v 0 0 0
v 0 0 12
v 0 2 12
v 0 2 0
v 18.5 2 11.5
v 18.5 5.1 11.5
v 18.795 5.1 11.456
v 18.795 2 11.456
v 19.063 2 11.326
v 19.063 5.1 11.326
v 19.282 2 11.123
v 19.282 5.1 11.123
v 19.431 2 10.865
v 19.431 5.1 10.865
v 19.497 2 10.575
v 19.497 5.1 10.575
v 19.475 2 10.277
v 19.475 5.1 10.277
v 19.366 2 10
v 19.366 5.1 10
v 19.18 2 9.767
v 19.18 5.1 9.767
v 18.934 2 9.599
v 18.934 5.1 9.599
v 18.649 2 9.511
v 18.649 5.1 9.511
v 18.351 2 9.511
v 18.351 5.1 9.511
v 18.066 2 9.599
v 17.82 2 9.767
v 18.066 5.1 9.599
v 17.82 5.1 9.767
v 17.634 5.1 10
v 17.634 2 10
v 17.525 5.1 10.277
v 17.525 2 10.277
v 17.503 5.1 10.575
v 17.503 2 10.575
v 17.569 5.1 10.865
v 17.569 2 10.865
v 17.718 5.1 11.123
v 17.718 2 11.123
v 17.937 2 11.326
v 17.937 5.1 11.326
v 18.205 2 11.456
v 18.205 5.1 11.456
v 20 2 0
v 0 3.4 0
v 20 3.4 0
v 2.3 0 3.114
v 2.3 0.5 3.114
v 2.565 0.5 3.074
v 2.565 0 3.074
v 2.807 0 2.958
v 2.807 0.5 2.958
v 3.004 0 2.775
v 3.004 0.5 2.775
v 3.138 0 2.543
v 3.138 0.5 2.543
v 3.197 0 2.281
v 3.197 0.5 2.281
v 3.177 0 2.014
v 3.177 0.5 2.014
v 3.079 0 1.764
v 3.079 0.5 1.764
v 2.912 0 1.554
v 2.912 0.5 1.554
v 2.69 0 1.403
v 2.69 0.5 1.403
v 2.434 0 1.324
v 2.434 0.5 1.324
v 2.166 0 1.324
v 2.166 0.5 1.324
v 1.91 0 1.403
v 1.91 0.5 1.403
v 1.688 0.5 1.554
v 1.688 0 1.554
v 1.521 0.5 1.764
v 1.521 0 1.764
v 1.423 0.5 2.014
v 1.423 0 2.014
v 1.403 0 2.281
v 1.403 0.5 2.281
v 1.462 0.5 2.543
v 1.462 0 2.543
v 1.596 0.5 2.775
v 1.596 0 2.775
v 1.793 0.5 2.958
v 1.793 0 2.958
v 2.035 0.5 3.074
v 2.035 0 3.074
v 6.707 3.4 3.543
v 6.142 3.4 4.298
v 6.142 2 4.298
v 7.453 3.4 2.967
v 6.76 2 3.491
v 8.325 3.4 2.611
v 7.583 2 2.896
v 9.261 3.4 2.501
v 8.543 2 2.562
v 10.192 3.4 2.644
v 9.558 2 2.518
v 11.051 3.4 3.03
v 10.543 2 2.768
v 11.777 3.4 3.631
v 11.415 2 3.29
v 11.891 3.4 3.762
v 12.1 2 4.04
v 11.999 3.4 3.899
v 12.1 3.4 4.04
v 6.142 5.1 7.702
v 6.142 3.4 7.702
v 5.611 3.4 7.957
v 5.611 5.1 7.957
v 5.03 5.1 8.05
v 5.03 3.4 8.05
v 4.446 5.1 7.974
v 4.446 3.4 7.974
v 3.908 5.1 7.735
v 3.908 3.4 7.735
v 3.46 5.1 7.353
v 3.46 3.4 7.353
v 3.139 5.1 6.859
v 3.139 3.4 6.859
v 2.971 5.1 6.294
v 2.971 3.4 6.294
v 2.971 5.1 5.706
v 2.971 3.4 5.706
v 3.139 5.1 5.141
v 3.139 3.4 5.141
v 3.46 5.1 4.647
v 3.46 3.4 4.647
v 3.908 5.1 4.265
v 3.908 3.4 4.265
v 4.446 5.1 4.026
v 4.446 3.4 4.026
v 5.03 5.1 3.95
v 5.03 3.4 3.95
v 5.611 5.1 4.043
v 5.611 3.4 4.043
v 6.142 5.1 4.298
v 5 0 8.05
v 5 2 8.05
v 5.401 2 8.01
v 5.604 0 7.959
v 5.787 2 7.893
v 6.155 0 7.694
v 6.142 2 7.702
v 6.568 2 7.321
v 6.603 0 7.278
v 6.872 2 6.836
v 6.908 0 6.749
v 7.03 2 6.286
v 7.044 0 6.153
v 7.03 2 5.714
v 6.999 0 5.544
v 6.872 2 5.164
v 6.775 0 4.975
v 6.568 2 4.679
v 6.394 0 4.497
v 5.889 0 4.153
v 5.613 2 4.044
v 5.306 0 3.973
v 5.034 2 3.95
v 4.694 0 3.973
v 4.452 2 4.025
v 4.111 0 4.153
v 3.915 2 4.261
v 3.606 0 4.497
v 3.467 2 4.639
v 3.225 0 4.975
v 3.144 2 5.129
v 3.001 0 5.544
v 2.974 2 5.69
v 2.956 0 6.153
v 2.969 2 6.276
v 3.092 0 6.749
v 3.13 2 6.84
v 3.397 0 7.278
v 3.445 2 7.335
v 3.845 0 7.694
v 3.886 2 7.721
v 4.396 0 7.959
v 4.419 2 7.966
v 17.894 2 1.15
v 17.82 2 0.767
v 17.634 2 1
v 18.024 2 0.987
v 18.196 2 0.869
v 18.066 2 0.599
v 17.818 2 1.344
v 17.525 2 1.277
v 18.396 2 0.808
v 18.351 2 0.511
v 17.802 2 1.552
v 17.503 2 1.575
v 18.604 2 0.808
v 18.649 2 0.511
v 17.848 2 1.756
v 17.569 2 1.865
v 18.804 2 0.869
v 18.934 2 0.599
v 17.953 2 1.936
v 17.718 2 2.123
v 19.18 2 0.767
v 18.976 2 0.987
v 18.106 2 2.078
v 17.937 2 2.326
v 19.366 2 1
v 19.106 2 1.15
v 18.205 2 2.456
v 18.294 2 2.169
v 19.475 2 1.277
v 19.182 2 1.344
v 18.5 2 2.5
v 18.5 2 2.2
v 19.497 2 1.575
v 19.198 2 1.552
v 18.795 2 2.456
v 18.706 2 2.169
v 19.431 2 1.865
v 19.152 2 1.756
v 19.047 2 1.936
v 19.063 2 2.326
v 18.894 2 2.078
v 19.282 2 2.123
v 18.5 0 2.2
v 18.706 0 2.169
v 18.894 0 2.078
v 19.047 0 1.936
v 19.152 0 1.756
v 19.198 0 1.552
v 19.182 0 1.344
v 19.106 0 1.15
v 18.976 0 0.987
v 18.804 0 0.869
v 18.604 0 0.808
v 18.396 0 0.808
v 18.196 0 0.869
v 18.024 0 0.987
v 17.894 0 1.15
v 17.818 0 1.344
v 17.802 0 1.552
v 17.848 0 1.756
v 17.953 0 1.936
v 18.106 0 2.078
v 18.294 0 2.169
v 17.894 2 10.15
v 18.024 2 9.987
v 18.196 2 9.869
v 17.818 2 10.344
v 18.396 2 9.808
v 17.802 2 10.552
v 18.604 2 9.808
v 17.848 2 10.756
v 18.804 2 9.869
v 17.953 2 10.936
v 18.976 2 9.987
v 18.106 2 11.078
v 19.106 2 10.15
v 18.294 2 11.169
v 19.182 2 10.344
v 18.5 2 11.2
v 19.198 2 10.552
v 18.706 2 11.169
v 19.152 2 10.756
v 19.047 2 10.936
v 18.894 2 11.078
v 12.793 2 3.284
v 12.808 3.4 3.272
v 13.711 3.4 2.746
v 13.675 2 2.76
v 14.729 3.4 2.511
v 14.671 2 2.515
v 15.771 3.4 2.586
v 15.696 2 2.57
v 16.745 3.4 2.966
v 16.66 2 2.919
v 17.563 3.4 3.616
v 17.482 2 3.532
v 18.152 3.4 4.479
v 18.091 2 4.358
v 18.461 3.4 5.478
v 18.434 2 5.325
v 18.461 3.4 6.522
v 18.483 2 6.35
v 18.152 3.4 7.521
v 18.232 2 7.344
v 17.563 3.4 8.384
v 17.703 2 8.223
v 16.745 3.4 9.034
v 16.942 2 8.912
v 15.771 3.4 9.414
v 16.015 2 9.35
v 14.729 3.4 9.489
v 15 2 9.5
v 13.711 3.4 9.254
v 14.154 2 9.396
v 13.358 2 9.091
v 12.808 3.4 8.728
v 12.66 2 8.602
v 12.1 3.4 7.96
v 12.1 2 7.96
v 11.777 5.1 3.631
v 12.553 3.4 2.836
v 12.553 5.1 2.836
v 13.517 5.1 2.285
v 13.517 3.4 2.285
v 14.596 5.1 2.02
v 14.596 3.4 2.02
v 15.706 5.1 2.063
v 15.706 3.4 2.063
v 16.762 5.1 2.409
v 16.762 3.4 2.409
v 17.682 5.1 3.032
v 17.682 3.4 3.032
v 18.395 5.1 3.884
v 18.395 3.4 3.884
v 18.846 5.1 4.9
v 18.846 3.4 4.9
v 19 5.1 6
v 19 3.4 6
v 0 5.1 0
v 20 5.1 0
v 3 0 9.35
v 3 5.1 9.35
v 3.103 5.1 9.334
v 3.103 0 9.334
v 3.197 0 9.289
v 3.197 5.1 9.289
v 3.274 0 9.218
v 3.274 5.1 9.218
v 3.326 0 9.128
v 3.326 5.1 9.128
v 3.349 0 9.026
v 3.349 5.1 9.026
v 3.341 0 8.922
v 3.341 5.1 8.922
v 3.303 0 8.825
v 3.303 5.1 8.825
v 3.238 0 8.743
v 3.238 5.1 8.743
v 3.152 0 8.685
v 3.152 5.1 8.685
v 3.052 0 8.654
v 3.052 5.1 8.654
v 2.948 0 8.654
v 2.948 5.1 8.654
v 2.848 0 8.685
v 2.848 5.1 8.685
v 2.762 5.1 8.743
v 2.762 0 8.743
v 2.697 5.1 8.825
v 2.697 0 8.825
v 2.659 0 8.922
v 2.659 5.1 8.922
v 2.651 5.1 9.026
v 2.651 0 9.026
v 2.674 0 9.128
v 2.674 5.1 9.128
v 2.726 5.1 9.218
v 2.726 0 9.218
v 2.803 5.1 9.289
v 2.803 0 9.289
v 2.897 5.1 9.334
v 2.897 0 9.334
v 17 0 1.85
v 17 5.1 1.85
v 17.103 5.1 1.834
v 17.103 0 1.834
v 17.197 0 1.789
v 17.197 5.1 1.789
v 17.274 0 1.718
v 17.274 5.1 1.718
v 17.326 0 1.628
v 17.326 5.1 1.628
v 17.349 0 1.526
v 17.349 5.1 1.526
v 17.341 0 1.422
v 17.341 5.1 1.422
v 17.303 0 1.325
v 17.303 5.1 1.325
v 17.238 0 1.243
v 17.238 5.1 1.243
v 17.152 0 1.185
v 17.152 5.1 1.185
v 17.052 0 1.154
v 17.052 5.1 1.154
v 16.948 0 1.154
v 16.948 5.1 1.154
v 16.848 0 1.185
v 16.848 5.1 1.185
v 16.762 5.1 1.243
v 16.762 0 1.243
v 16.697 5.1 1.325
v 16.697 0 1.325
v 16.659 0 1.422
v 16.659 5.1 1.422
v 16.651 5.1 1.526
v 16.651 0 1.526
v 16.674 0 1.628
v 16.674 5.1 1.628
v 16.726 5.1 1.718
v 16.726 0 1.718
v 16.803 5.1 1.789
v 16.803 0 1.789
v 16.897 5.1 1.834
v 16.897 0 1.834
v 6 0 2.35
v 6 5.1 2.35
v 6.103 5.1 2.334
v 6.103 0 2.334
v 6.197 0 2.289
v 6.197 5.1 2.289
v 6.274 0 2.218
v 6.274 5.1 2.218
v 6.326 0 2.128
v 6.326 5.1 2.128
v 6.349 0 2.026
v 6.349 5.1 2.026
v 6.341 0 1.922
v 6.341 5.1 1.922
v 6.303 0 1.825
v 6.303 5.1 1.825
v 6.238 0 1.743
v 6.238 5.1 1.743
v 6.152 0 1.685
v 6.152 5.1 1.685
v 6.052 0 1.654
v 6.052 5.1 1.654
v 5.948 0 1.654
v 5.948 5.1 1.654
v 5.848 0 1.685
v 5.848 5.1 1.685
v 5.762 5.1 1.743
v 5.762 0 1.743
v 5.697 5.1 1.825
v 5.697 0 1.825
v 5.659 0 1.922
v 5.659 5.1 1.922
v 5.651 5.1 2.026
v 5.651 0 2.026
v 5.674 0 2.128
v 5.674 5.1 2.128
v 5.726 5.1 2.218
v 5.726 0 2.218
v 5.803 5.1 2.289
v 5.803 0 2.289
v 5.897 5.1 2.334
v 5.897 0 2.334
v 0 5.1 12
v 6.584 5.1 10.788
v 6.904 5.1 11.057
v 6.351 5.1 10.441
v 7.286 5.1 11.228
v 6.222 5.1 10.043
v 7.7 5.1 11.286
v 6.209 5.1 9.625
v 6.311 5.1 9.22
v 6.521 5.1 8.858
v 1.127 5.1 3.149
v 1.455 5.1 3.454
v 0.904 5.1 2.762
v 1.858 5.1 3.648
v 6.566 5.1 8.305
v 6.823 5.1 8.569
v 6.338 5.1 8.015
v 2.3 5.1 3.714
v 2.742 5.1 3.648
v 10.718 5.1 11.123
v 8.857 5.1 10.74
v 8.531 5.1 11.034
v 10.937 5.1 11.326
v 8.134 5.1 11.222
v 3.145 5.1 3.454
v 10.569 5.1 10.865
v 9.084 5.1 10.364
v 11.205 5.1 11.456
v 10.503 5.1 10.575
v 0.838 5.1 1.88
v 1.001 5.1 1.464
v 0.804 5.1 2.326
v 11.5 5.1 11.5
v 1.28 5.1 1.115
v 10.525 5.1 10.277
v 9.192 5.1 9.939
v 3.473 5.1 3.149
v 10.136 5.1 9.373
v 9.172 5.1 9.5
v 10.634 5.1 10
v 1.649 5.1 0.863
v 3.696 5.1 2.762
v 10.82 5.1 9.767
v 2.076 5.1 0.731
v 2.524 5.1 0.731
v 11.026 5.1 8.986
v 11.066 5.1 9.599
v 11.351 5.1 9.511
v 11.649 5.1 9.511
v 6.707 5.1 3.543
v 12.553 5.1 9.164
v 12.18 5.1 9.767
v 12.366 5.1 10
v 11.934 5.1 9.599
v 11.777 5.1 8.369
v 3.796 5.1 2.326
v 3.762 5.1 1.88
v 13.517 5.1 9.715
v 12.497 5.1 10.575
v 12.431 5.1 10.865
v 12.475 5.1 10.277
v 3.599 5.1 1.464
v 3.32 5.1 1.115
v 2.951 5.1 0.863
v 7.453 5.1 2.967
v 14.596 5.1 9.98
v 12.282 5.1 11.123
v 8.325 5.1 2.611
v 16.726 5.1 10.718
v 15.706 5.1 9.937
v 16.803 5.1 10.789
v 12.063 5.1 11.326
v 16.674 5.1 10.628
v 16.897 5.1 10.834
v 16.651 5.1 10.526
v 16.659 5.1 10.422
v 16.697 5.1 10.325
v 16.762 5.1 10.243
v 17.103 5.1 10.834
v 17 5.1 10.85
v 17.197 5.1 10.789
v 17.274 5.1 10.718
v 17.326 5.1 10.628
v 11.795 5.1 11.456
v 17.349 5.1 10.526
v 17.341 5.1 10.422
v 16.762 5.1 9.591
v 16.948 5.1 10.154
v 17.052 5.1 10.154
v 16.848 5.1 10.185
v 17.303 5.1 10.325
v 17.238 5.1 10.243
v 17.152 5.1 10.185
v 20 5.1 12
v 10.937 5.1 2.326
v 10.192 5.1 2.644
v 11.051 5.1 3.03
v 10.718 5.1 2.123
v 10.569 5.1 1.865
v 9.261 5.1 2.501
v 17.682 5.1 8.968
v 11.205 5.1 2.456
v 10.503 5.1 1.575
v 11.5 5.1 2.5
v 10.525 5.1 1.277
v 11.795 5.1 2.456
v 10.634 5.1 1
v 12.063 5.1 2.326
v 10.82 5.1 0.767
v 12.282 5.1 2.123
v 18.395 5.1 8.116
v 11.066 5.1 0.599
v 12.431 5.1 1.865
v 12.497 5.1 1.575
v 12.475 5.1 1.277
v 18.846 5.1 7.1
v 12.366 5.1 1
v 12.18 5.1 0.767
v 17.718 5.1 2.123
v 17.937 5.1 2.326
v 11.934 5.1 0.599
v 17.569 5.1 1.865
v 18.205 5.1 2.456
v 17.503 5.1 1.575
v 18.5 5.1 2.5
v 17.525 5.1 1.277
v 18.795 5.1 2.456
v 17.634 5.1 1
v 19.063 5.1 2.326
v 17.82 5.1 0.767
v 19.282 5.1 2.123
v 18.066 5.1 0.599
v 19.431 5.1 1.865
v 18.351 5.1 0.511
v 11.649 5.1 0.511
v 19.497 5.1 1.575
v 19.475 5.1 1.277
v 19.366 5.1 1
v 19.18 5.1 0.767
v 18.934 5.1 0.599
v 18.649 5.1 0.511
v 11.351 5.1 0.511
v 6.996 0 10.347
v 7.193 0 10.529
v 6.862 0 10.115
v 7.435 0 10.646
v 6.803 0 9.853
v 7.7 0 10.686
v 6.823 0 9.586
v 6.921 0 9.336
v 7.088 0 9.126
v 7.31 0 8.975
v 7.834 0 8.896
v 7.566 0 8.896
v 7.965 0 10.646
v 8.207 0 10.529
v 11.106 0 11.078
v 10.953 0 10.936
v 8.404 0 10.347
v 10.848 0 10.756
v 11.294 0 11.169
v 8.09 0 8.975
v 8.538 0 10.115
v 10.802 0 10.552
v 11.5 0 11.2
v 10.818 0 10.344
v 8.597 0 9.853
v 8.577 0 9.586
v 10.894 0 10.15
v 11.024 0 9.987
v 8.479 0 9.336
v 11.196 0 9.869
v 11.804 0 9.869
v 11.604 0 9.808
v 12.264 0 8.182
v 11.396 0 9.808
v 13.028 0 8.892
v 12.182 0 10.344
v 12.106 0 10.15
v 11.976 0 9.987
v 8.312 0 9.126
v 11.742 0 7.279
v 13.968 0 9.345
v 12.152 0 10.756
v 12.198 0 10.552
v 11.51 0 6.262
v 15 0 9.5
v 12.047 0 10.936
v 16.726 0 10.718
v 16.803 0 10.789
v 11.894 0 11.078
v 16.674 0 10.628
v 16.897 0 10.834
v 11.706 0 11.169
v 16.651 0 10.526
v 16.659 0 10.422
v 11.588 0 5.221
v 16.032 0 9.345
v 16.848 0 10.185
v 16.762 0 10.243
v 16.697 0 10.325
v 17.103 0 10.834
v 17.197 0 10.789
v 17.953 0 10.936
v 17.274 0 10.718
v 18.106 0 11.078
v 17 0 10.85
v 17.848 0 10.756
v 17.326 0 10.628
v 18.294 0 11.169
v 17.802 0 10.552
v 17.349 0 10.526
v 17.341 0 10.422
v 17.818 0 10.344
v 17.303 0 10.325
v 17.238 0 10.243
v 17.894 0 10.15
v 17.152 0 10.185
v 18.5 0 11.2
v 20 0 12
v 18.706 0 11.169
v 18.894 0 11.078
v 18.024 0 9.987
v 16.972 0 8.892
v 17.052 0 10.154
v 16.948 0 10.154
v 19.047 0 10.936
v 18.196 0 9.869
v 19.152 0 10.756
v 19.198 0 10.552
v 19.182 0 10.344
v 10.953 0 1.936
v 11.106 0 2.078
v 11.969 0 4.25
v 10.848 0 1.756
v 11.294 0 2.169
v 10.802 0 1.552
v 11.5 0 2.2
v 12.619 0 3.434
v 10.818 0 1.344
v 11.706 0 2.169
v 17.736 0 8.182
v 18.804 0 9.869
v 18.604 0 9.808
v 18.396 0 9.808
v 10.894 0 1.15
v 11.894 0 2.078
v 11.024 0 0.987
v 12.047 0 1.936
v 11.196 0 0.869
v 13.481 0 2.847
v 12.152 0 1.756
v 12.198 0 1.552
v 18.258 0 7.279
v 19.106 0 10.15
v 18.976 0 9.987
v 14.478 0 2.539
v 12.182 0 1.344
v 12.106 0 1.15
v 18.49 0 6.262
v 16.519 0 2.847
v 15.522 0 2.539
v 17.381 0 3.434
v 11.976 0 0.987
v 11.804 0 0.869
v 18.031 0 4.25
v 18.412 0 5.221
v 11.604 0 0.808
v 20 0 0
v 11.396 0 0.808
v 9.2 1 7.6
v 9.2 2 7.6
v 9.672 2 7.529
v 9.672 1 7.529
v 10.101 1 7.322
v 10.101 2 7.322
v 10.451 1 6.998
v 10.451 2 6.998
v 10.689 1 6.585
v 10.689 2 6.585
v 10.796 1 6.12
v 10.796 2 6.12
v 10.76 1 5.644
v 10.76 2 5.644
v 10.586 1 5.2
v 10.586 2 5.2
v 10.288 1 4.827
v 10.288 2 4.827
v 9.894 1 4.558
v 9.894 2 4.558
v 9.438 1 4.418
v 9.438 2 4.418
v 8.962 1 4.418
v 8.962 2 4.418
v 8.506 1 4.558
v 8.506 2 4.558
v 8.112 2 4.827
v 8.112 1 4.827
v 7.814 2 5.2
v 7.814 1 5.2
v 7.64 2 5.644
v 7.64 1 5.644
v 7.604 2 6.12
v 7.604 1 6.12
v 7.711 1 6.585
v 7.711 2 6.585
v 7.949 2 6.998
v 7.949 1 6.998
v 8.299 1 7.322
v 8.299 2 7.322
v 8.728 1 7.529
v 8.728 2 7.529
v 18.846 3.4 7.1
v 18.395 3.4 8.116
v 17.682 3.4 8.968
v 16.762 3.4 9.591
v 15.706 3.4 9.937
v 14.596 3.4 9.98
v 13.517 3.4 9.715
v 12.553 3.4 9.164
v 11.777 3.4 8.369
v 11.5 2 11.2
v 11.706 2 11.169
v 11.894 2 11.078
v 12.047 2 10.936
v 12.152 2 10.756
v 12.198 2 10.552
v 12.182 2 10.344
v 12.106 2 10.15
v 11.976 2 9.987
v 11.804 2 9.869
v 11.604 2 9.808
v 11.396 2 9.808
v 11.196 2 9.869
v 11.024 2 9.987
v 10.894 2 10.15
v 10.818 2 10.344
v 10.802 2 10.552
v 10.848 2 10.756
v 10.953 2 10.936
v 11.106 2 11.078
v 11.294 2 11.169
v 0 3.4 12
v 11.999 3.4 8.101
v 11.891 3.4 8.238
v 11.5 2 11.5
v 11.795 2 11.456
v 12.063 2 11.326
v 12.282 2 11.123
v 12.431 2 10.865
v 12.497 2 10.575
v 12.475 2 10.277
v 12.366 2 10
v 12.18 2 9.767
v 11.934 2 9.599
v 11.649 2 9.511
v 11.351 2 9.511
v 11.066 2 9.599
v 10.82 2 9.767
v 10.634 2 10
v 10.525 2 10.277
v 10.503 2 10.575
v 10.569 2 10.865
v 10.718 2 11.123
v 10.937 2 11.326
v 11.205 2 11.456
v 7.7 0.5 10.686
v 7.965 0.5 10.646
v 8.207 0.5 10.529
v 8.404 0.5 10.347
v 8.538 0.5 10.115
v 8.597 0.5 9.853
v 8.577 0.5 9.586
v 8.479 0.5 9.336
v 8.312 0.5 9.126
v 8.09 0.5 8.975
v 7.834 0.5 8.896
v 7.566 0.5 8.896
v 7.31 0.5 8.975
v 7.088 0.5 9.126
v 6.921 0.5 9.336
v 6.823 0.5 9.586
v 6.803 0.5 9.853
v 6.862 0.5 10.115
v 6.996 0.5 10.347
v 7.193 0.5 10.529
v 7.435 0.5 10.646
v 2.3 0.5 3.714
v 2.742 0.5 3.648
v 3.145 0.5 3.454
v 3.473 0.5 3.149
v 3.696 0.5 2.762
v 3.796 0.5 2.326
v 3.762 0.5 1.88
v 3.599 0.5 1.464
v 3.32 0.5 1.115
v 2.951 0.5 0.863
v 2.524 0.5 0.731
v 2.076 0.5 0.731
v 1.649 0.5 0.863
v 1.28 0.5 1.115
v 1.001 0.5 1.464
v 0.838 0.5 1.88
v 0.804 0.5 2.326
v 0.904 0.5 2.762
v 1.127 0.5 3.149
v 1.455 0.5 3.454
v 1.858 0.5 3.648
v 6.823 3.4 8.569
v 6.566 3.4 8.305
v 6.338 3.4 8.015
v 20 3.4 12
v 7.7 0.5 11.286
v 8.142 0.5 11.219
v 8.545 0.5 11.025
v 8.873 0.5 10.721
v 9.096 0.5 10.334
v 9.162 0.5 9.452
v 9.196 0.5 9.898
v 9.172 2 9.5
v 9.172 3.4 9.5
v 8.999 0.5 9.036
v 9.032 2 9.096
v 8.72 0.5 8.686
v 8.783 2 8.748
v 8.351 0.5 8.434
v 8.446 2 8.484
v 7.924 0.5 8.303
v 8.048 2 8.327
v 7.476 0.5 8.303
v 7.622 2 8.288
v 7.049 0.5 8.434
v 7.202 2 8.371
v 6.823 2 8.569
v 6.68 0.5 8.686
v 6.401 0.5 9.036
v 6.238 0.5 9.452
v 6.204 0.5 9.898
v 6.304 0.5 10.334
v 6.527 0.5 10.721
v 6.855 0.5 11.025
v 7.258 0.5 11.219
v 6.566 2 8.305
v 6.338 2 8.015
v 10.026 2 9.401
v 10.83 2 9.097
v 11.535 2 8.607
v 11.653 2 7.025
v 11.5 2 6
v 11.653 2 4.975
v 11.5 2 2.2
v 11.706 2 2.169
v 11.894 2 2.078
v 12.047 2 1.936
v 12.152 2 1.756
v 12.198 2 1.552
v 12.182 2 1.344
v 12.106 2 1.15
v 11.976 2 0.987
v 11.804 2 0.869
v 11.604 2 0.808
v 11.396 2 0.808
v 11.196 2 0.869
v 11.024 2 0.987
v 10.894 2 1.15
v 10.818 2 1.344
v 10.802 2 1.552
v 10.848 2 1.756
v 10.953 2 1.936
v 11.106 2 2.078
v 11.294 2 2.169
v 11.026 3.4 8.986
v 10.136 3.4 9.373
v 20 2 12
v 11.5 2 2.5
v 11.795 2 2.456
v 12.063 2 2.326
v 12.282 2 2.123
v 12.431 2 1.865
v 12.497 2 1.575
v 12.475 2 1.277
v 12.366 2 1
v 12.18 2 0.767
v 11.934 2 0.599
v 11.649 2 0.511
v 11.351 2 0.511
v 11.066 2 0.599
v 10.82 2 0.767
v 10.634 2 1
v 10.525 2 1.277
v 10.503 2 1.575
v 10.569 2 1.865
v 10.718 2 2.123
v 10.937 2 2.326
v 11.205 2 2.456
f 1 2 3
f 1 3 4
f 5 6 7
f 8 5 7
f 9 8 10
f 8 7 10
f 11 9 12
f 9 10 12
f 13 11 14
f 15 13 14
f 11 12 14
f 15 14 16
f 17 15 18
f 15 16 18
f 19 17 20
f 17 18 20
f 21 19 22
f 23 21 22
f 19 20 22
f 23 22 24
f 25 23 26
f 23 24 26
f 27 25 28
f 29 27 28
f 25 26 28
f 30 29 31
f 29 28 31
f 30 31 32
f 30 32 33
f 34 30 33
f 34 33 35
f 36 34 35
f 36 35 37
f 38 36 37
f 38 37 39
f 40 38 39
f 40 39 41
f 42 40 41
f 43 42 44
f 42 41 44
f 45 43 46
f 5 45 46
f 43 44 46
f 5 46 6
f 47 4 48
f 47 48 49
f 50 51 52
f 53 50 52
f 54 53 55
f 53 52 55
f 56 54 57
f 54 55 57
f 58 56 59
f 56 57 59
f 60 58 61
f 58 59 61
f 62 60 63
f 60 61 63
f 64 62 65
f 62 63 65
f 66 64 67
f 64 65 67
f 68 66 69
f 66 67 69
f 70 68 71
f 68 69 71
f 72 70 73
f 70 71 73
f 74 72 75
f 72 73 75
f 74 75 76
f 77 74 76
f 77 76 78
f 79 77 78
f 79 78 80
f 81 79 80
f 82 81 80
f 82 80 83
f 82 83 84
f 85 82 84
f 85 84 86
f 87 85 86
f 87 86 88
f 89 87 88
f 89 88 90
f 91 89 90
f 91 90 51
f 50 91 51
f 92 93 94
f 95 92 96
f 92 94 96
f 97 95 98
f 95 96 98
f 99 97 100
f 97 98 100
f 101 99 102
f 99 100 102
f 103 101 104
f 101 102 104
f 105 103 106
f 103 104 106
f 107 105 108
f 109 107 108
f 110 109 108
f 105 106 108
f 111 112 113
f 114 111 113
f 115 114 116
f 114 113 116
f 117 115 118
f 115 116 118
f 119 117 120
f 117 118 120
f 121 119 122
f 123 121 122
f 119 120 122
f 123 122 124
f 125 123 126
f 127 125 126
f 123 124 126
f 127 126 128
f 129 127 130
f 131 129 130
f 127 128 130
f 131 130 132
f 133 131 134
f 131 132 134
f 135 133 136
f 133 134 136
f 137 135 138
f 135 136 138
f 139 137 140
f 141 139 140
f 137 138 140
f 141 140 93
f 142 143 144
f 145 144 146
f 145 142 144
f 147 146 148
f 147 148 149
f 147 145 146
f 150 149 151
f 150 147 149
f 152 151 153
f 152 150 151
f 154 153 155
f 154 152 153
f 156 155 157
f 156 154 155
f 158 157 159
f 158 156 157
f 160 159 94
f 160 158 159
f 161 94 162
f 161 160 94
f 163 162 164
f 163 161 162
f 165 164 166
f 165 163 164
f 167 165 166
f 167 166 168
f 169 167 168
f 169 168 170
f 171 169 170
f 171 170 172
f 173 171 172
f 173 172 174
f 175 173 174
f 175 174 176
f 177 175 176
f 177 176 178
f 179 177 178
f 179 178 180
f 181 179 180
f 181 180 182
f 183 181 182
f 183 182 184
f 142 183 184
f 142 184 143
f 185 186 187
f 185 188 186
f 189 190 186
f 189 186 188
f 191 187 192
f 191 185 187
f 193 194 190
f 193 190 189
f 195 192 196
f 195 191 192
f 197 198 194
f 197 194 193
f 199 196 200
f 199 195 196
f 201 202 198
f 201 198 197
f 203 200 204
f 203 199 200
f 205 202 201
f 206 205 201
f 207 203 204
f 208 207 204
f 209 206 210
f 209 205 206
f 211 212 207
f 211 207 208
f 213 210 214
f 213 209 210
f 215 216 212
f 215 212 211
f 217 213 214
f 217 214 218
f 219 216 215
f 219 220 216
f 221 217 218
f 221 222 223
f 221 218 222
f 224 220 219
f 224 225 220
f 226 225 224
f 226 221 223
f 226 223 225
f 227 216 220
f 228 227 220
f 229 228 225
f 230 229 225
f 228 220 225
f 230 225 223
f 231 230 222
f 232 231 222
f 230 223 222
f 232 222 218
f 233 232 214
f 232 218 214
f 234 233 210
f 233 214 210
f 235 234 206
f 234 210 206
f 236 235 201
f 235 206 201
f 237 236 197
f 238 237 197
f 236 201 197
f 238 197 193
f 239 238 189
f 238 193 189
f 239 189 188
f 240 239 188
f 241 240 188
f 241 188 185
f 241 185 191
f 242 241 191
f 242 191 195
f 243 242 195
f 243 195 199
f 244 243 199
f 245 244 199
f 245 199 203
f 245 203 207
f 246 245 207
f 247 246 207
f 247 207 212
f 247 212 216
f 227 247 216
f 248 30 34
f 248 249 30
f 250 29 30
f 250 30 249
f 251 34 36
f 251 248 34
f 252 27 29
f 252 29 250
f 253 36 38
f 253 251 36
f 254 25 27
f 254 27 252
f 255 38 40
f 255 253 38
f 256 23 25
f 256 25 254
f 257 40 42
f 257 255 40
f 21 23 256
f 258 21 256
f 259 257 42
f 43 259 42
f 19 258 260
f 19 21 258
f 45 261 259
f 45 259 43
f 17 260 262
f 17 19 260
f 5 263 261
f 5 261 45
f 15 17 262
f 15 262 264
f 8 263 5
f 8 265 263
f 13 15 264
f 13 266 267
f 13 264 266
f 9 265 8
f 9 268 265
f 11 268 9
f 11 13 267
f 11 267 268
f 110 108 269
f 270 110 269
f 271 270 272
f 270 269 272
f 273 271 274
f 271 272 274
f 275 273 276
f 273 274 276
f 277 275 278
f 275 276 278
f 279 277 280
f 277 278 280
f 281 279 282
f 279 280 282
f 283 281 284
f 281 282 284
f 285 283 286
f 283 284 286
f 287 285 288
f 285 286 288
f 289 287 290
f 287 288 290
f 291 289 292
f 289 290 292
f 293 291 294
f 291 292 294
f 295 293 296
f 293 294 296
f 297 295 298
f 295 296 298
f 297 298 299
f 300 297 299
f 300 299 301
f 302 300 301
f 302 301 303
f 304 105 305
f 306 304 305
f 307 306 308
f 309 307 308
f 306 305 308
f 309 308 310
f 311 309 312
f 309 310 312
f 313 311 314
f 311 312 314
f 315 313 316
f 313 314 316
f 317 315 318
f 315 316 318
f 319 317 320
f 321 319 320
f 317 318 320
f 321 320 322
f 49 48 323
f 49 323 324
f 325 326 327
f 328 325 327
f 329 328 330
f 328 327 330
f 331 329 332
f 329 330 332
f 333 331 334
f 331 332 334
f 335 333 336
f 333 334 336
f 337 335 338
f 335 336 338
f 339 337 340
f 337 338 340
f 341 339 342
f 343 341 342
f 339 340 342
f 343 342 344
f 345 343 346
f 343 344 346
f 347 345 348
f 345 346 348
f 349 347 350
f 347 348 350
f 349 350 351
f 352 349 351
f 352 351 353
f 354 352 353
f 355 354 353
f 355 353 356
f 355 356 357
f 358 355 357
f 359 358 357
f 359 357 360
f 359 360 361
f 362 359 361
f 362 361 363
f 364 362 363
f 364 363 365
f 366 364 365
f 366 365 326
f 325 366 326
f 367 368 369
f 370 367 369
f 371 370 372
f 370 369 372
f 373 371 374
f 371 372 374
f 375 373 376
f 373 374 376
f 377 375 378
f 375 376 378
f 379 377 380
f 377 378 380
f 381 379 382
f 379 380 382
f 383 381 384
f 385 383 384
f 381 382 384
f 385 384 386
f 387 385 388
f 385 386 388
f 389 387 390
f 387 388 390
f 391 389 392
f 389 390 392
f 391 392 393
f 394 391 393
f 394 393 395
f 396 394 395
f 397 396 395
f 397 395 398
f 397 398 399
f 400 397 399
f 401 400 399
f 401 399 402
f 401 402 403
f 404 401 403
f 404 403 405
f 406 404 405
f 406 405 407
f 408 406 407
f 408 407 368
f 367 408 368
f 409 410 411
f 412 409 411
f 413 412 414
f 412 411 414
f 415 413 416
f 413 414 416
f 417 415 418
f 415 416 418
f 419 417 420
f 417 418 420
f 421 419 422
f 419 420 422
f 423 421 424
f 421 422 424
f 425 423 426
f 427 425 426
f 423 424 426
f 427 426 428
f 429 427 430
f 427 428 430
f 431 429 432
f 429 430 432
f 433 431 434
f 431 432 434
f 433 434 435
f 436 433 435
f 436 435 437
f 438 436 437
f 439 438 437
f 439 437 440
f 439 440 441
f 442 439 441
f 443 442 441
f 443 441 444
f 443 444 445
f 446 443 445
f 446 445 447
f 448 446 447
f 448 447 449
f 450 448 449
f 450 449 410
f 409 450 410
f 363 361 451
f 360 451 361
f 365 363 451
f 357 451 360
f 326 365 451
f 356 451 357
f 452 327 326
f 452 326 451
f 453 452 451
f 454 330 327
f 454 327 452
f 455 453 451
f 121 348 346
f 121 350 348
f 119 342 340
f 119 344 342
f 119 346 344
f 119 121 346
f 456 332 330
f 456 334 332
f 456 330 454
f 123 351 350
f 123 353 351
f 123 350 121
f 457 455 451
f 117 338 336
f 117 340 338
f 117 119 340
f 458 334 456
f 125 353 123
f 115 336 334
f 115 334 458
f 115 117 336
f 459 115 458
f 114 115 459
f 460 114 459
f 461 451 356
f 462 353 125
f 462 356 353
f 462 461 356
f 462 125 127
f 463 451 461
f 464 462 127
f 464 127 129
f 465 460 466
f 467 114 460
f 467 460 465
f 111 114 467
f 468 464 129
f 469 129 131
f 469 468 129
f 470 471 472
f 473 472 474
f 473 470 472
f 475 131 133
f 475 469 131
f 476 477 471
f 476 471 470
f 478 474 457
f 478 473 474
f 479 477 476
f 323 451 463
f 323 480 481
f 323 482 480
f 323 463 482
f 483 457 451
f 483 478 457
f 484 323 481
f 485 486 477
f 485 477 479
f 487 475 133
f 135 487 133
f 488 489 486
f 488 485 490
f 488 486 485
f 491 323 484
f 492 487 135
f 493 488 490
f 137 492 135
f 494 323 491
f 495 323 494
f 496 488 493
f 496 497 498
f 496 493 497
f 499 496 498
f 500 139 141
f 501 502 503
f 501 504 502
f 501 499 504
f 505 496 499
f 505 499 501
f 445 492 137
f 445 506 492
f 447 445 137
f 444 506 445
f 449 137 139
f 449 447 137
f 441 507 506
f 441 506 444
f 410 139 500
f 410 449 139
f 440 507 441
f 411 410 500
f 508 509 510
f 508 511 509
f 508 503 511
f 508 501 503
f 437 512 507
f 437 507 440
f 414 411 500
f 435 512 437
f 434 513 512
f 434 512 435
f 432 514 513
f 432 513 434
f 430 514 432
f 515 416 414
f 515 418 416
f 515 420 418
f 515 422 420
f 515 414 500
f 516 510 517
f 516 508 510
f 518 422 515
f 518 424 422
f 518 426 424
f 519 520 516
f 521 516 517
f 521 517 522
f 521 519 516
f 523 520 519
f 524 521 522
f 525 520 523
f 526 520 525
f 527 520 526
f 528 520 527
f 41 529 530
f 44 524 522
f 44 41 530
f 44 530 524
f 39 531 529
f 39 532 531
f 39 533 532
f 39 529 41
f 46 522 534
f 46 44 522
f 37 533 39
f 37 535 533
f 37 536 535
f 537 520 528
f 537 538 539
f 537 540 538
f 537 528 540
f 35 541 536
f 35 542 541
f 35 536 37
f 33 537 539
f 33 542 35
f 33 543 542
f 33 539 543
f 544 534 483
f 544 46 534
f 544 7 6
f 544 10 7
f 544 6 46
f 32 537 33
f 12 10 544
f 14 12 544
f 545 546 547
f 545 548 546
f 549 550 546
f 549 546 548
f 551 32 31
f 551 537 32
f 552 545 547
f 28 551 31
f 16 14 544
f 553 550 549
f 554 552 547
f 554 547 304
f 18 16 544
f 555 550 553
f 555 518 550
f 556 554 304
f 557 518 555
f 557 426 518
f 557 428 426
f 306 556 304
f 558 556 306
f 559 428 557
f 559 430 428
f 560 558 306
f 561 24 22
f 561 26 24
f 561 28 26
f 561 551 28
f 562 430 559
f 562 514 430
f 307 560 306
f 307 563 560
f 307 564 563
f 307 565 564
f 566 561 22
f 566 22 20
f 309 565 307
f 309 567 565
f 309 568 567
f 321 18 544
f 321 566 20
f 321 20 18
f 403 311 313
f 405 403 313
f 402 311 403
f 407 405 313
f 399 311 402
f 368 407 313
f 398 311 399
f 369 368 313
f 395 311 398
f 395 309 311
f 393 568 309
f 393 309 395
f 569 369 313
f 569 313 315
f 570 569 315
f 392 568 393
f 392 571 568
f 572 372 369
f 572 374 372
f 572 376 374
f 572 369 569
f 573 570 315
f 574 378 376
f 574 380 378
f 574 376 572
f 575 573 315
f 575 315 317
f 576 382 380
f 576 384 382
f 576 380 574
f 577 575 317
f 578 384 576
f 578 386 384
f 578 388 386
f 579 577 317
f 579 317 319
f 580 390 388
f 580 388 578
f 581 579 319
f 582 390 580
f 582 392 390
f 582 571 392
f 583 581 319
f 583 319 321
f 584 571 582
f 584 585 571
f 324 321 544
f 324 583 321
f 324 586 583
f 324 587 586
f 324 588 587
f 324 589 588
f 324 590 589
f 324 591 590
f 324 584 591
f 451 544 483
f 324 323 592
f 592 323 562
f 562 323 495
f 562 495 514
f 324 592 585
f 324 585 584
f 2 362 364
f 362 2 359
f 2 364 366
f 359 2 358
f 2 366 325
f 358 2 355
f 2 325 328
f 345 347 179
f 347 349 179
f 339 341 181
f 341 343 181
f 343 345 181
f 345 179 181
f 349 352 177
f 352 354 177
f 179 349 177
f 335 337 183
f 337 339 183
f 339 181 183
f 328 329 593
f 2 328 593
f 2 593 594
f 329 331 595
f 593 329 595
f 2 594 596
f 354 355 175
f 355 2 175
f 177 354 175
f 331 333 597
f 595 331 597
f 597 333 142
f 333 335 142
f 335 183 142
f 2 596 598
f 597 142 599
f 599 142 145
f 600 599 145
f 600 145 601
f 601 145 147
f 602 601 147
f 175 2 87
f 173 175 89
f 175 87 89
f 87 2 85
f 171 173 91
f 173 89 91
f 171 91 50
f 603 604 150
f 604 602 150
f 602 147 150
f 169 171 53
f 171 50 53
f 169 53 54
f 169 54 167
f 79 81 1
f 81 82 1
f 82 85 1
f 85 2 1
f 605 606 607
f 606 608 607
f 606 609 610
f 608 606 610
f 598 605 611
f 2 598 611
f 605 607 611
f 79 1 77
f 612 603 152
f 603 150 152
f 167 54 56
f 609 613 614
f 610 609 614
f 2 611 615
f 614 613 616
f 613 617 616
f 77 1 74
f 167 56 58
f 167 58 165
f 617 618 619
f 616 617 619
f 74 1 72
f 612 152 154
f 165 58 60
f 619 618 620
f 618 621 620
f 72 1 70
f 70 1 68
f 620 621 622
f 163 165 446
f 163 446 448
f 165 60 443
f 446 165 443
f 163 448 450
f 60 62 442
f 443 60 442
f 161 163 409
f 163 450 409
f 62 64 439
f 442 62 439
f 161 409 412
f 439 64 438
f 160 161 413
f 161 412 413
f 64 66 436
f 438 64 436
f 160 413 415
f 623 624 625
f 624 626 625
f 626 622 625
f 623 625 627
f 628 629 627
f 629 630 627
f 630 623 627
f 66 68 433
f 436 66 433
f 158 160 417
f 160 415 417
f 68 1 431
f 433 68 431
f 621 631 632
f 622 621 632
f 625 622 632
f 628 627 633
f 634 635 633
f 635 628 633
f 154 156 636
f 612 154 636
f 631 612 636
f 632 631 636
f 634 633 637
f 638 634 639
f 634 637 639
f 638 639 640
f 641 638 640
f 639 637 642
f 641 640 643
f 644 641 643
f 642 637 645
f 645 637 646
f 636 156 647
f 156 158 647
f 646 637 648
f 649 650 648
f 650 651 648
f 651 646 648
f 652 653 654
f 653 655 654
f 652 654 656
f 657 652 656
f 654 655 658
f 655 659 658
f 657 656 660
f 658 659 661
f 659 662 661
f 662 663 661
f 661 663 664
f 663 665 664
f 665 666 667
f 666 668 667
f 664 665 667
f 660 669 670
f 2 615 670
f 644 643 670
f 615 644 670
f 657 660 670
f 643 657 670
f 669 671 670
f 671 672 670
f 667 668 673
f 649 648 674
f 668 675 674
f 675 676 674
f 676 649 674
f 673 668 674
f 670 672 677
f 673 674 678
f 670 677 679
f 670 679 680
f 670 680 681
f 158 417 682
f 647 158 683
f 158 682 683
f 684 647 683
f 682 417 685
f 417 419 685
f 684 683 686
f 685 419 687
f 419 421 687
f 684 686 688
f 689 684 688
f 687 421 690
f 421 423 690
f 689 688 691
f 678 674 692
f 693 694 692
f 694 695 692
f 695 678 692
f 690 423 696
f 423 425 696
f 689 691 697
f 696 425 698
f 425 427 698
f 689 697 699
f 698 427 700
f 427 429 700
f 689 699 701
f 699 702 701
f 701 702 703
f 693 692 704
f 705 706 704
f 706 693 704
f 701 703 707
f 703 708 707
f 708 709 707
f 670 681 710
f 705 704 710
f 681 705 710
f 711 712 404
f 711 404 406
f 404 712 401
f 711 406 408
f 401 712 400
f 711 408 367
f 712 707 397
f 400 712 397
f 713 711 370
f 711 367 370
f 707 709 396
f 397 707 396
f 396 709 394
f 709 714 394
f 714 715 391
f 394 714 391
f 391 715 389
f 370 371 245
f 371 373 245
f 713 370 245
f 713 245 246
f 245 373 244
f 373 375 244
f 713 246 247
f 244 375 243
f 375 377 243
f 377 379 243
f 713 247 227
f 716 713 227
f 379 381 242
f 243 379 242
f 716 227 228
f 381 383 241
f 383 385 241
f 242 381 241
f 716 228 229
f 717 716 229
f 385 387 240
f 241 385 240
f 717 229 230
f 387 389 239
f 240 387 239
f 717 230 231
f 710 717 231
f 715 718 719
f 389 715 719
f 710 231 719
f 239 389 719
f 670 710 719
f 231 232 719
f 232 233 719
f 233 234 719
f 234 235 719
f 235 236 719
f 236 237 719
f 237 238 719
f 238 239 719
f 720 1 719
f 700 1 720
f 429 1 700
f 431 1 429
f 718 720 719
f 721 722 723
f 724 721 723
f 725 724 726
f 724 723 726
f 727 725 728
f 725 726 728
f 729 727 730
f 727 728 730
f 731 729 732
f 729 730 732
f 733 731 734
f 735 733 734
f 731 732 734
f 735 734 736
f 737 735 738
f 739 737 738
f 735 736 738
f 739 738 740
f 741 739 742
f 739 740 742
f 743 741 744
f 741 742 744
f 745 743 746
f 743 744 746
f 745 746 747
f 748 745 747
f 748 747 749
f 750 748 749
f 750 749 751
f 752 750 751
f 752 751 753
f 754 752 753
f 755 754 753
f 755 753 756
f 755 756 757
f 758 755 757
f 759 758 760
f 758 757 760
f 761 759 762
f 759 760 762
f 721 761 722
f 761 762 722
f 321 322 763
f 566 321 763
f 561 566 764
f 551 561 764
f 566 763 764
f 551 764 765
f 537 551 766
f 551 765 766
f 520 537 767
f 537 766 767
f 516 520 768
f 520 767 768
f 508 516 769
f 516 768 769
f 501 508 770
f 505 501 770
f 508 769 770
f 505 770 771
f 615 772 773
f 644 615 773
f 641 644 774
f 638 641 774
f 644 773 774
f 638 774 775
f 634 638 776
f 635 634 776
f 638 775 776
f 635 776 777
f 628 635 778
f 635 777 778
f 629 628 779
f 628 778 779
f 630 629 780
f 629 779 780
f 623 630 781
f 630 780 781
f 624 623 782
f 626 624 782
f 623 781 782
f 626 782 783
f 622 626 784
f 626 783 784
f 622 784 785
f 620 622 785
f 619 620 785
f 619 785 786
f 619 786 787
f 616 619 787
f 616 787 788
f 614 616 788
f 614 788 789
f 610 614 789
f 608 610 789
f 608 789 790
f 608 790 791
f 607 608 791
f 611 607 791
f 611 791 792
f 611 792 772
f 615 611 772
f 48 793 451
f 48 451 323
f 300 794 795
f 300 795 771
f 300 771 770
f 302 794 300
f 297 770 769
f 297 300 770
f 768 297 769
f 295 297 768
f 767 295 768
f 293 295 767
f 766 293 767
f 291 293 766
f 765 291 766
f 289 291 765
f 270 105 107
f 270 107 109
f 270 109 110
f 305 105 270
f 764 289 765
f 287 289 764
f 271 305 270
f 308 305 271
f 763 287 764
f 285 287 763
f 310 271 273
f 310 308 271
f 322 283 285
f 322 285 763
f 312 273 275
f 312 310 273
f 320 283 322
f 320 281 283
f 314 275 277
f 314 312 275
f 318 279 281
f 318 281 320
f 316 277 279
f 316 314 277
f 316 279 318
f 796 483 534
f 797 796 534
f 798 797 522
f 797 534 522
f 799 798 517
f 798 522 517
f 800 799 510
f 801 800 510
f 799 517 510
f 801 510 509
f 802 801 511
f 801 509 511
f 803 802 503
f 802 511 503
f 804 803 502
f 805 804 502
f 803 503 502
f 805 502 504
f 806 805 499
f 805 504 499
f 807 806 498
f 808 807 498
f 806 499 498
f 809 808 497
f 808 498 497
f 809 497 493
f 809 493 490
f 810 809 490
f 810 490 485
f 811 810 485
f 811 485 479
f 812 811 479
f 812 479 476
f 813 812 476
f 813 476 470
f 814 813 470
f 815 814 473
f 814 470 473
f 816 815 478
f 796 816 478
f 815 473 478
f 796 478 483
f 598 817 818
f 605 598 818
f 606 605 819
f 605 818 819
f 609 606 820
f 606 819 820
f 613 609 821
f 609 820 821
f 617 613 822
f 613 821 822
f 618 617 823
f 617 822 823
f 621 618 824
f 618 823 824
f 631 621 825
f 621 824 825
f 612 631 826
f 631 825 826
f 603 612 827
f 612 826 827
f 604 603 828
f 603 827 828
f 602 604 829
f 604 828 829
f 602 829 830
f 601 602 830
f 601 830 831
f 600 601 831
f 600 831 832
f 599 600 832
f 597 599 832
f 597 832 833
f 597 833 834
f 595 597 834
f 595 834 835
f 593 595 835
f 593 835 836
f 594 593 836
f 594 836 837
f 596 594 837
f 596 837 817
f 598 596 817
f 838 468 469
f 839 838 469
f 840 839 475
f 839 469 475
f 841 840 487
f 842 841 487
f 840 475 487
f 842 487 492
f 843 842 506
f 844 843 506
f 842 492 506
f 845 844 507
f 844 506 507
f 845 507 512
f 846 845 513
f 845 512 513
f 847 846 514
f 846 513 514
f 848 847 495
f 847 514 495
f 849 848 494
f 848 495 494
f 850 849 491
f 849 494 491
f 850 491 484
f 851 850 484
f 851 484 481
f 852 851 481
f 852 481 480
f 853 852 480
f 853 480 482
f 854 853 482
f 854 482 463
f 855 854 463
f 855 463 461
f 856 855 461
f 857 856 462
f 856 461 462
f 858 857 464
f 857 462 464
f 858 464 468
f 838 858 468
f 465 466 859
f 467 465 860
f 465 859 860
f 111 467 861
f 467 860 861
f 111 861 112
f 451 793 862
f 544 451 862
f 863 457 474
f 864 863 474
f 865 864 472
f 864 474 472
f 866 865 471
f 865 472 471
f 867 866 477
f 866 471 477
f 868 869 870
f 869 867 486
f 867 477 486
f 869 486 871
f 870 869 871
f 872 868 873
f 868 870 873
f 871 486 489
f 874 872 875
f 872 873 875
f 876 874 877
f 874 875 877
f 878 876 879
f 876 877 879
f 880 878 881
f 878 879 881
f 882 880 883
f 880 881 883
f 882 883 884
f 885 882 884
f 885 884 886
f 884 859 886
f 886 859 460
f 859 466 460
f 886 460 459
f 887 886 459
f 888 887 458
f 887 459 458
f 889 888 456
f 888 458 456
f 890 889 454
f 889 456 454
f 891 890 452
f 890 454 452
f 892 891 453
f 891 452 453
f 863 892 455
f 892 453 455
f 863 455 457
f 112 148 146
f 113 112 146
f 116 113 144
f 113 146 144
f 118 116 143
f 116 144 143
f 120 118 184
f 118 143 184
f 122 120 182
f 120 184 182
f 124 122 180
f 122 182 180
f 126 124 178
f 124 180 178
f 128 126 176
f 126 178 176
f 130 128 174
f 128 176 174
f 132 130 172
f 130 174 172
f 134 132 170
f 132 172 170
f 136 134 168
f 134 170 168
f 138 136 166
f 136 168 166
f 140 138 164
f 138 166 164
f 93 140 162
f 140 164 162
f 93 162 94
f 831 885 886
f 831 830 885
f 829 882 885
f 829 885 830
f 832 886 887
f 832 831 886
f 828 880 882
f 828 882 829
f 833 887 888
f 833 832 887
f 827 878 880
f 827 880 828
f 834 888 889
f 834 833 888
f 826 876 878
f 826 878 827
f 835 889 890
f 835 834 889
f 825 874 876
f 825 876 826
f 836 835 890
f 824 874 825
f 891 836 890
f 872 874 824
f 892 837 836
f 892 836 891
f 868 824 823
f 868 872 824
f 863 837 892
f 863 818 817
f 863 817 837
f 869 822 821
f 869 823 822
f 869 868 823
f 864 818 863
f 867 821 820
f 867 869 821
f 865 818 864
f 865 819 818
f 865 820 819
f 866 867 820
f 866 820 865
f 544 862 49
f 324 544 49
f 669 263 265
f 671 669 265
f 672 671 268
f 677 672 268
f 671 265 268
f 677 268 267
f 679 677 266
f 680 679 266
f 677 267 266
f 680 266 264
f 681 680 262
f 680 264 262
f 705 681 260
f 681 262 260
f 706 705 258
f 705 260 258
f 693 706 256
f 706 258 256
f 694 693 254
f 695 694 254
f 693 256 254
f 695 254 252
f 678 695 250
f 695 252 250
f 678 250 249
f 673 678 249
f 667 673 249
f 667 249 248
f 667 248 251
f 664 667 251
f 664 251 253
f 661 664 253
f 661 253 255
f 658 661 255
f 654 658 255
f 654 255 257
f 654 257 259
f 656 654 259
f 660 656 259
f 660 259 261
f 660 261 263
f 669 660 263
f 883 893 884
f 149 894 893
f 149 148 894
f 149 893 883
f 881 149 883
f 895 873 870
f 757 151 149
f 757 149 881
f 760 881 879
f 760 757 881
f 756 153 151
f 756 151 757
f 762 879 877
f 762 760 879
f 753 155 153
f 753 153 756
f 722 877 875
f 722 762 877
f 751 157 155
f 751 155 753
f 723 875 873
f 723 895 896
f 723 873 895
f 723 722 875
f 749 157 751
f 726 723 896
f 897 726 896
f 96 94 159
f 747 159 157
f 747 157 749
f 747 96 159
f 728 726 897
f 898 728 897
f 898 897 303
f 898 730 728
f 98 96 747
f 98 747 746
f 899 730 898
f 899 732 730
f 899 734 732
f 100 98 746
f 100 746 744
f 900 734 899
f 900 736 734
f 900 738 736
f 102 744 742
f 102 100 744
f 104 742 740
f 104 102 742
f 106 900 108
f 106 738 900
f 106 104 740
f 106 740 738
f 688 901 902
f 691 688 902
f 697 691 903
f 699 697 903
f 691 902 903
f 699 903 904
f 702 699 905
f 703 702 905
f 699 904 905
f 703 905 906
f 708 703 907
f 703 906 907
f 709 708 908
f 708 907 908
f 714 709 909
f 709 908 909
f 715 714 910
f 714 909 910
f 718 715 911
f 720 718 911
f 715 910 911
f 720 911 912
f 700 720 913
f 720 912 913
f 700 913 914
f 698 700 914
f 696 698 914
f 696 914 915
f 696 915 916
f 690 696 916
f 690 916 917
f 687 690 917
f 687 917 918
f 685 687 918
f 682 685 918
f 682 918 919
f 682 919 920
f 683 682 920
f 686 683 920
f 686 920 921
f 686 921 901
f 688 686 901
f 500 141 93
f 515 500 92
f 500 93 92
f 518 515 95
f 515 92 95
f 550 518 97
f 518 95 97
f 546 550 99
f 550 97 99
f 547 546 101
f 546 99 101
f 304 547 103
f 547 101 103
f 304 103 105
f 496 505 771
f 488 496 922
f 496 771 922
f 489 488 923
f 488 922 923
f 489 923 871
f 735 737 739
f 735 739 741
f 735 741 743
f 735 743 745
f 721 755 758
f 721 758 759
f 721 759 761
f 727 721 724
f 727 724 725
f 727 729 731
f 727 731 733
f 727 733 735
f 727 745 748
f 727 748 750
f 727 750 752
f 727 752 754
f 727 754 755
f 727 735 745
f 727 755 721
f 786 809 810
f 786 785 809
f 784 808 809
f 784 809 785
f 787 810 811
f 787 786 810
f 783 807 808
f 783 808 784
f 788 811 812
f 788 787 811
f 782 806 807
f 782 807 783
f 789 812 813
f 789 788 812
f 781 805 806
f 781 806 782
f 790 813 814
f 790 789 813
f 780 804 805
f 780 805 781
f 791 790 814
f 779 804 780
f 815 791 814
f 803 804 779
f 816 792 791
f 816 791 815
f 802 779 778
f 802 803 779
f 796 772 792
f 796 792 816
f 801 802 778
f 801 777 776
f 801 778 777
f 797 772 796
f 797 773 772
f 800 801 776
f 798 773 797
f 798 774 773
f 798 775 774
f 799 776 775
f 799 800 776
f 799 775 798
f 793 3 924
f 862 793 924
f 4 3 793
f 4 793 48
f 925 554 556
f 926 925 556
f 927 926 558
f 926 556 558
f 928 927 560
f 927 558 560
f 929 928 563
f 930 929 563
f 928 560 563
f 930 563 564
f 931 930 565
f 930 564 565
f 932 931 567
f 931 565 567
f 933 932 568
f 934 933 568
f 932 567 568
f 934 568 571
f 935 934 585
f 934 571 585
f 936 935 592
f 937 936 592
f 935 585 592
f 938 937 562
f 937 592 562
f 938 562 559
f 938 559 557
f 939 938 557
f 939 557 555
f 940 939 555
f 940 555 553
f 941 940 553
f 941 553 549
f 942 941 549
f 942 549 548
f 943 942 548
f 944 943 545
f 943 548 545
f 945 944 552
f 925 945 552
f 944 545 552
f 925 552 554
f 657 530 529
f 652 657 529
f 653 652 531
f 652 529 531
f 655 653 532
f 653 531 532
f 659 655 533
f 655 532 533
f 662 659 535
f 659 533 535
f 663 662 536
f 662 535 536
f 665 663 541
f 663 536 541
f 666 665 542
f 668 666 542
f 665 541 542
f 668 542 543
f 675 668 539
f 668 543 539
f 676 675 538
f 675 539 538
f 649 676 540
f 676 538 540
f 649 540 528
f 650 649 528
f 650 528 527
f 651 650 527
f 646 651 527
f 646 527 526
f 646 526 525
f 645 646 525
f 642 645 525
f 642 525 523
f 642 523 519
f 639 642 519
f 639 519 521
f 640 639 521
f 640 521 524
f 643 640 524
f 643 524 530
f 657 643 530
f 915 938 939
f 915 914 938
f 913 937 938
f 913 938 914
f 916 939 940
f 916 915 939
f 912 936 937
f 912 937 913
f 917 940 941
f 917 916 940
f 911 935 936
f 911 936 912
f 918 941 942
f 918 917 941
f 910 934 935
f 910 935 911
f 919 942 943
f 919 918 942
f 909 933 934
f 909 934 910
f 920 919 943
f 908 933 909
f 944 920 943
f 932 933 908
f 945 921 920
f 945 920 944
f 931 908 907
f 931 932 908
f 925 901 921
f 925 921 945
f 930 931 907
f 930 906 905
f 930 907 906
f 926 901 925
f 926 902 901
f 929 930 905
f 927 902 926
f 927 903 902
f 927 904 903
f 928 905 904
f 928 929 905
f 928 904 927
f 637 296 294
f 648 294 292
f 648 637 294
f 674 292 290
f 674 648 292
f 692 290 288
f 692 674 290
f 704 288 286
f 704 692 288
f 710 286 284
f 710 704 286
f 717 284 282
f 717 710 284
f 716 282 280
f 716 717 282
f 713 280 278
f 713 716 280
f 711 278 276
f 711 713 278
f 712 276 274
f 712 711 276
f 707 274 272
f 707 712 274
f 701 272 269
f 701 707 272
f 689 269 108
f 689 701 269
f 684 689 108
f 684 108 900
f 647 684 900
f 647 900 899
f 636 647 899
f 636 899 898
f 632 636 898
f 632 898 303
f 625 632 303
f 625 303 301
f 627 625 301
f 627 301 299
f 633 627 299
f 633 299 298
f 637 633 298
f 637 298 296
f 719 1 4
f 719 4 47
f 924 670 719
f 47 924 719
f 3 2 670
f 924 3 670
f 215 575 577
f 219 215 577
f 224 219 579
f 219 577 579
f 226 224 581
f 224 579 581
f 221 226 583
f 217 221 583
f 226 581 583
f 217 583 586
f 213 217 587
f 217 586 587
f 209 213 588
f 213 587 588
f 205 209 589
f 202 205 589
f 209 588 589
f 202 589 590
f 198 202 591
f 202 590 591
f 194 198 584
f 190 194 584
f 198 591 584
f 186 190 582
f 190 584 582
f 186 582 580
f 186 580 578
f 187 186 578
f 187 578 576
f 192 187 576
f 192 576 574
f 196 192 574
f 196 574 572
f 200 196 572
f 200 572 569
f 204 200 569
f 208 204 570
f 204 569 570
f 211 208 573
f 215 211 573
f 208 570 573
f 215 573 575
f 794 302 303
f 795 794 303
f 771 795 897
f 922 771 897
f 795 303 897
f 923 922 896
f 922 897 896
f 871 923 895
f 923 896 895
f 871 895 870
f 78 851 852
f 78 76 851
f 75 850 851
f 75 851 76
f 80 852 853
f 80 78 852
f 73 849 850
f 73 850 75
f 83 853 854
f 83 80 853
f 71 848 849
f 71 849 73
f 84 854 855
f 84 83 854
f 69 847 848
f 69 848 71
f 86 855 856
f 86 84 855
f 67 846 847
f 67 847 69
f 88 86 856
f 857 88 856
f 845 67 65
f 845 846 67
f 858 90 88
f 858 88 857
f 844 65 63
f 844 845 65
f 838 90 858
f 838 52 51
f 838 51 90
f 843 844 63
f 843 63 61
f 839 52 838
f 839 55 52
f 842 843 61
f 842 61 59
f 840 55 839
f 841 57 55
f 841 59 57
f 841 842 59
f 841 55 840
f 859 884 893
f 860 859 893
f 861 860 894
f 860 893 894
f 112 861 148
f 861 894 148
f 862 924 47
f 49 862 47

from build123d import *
from build123d.topology import SkipClean

# Parameters (mm, degrees)
SKETCH_1_W          = 20
SKETCH_1_H          = 12
SKETCH_1_R          = 2.05
SKETCH_1_R_2        = 3.5
EXTRUDE_1_DEPTH     = 2
CUT_EXTRUDE_START   = 2
SKETCH_1_3_R        = 1.6
CUT_EXTRUDE_6_DEPTH = 1
SKETCH_3_W          = 20
SKETCH_3_H          = 12
EXTRUDE_3_DEPTH     = 1.4
EXTRUDE_START       = 1.4
SKETCH_3_17_W       = 20
SKETCH_3_17_H       = 12
EXTRUDE_4_DEPTH     = 1.7
CUT_EXTRUDE_START_2 = 5.1
SKETCH_5_R          = 0.9
CUT_EXTRUDE_1_DEPTH = 29.974882199
SKETCH_5_10_R       = 1.5
CUT_EXTRUDE_3_DEPTH = 4.6
SKETCH_7_R          = 0.35
SKETCH_7_R_2        = 0.7
CUT_EXTRUDE_4_DEPTH = 24.874882199
SKETCH_7_3_R        = 1
CUT_EXTRUDE_7_DEPTH = 3.1


with BuildPart() as part:
    # 草图1 → 凸台-拉伸1 (new body)
    with BuildSketch(Plane(origin=(0, 0, 0), x_dir=(1, 0, 0), z_dir=(0, 1, 0))):
        with Locations((10, -6)):
            Rectangle(SKETCH_1_W, SKETCH_1_H)
        with Locations(Location((5, -6, 0), (0, 0, 270))):
            Circle(SKETCH_1_R, mode=Mode.SUBTRACT)
        with Locations(Location((15, -6, 0), (0, 0, 270))):
            Circle(SKETCH_1_R_2, mode=Mode.SUBTRACT)
    extrude(amount=EXTRUDE_1_DEPTH)

    # 草图1<3> → 切除-拉伸6 (cut)
    with BuildSketch(Plane(origin=(0, 0, 0), x_dir=(1, 0, 0), z_dir=(0, 1, 0)).offset(CUT_EXTRUDE_START)):
        with Locations(Location((9.2, -6, 0), (0, 0, 270))):
            Circle(SKETCH_1_3_R)
    extrude(amount=-CUT_EXTRUDE_6_DEPTH, mode=Mode.SUBTRACT)

    # 草图3 → 凸台-拉伸3 (add)
    with SkipClean():  # the faces are left unmerged after this step: merging them gives an invalid solid
        with BuildSketch(Plane(origin=(0, 2, 0), x_dir=(1, 0, 0), z_dir=(0, 1, 0))):
            with Locations((10, -6)):
                Rectangle(SKETCH_3_W, SKETCH_3_H)
            with BuildLine():
                ThreePointArc((6.141964286, -7.702473956), (2.95, -6), (6.141964286, -4.297526044))
                ThreePointArc((6.141964286, -4.297526044), (9.04909865, -2.503254544), (12.1, -4.040408206))
                ThreePointArc((12.1, -4.040408206), (18.5, -6), (12.1, -7.959591794))
                ThreePointArc((12.1, -7.959591794), (9.04909865, -9.496745456), (6.141964286, -7.702473956))
            make_face(mode=Mode.SUBTRACT)
        extrude(amount=EXTRUDE_3_DEPTH)

    # 草图3<17> → 凸台-拉伸4 (add)
    with SkipClean():  # the faces are left unmerged after this step: merging them gives an invalid solid
        with BuildSketch(Plane(origin=(0, 2, 0), x_dir=(1, 0, 0), z_dir=(0, 1, 0)).offset(EXTRUDE_START)):
            with Locations((10, -6)):
                Rectangle(SKETCH_3_17_W, SKETCH_3_17_H)
            with BuildLine():
                ThreePointArc((6.141964286, -7.702473956), (2.95, -6), (6.141964286, -4.297526044))
                ThreePointArc((6.141964286, -4.297526044), (8.789071626, -2.524206872), (11.776724138, -3.631352133))
                ThreePointArc((11.776724138, -3.631352133), (16.246374051, -2.199138029), (19, -6))
                ThreePointArc((19, -6), (16.246374051, -9.800861971), (11.776724138, -8.368647867))
                ThreePointArc((11.776724138, -8.368647867), (8.789071626, -9.475793128), (6.141964286, -7.702473956))
            make_face(mode=Mode.SUBTRACT)
        extrude(amount=EXTRUDE_4_DEPTH)

    # 草图5 → 切除-拉伸1 (cut, through all)
    with SkipClean():  # the faces are left unmerged after this step: merging them gives an invalid solid
        with BuildSketch(Plane(origin=(0, 0, 0), x_dir=(1, 0, 0), z_dir=(0, 1, 0)).offset(CUT_EXTRUDE_START_2)):
            with Locations(Location((2.3, -2.214171161, 0), (0, 0, 270))):
                Circle(SKETCH_5_R)
            with Locations(Location((7.7, -9.785828839, 0), (0, 0, 270))):
                Circle(SKETCH_5_R)
        extrude(amount=-CUT_EXTRUDE_1_DEPTH, mode=Mode.SUBTRACT)

    # 草图5<10> → 切除-拉伸3 (cut)
    with SkipClean():  # the faces are left unmerged after this step: merging them gives an invalid solid
        with BuildSketch(Plane(origin=(0, 0, 0), x_dir=(1, 0, 0), z_dir=(0, 1, 0)).offset(CUT_EXTRUDE_START_2)):
            with Locations(Location((2.3, -2.214171161, 0), (0, 0, 270))):
                Circle(SKETCH_5_10_R)
            with Locations(Location((7.7, -9.785828839, 0), (0, 0, 270))):
                Circle(SKETCH_5_10_R)
        extrude(amount=-CUT_EXTRUDE_3_DEPTH, mode=Mode.SUBTRACT)

    # 草图7 → 切除-拉伸4 (cut, through all)
    with SkipClean():  # the faces are left unmerged after this step: merging them gives an invalid solid
        with BuildSketch(Plane(origin=(0, 5.1, 0), x_dir=(1, 0, 0), z_dir=(0, 1, 0))):
            with Locations(Location((6, -2, 0), (0, 0, 270))):
                Circle(SKETCH_7_R)
            with Locations(Location((3, -9, 0), (0, 0, 270))):
                Circle(SKETCH_7_R)
            with Locations(Location((17, -1.5, 0), (0, 0, 270))):
                Circle(SKETCH_7_R)
            with Locations(Location((17, -10.5, 0), (0, 0, 270))):
                Circle(SKETCH_7_R)
            with Locations(Location((11.5, -1.5, 0), (0, 0, 270))):
                Circle(SKETCH_7_R_2)
            with Locations(Location((18.5, -10.5, 0), (0, 0, 270))):
                Circle(SKETCH_7_R_2)
            with Locations(Location((11.5, -10.5, 0), (0, 0, 270))):
                Circle(SKETCH_7_R_2)
            with Locations(Location((18.5, -1.5, 0), (0, 0, 270))):
                Circle(SKETCH_7_R_2)
        extrude(amount=-CUT_EXTRUDE_4_DEPTH, mode=Mode.SUBTRACT)

    # 草图7<3> → 切除-拉伸7 (cut)
    with SkipClean():  # the faces are left unmerged after this step: merging them gives an invalid solid
        with BuildSketch(Plane(origin=(0, 5.1, 0), x_dir=(1, 0, 0), z_dir=(0, 1, 0))):
            with Locations(Location((11.5, -1.5, 0), (0, 0, 270))):
                Circle(SKETCH_7_3_R)
            with Locations(Location((18.5, -10.5, 0), (0, 0, 270))):
                Circle(SKETCH_7_3_R)
            with Locations(Location((11.5, -10.5, 0), (0, 0, 270))):
                Circle(SKETCH_7_3_R)
            with Locations(Location((18.5, -1.5, 0), (0, 0, 270))):
                Circle(SKETCH_7_3_R)
        extrude(amount=-CUT_EXTRUDE_7_DEPTH, mode=Mode.SUBTRACT)


solid = part.part
